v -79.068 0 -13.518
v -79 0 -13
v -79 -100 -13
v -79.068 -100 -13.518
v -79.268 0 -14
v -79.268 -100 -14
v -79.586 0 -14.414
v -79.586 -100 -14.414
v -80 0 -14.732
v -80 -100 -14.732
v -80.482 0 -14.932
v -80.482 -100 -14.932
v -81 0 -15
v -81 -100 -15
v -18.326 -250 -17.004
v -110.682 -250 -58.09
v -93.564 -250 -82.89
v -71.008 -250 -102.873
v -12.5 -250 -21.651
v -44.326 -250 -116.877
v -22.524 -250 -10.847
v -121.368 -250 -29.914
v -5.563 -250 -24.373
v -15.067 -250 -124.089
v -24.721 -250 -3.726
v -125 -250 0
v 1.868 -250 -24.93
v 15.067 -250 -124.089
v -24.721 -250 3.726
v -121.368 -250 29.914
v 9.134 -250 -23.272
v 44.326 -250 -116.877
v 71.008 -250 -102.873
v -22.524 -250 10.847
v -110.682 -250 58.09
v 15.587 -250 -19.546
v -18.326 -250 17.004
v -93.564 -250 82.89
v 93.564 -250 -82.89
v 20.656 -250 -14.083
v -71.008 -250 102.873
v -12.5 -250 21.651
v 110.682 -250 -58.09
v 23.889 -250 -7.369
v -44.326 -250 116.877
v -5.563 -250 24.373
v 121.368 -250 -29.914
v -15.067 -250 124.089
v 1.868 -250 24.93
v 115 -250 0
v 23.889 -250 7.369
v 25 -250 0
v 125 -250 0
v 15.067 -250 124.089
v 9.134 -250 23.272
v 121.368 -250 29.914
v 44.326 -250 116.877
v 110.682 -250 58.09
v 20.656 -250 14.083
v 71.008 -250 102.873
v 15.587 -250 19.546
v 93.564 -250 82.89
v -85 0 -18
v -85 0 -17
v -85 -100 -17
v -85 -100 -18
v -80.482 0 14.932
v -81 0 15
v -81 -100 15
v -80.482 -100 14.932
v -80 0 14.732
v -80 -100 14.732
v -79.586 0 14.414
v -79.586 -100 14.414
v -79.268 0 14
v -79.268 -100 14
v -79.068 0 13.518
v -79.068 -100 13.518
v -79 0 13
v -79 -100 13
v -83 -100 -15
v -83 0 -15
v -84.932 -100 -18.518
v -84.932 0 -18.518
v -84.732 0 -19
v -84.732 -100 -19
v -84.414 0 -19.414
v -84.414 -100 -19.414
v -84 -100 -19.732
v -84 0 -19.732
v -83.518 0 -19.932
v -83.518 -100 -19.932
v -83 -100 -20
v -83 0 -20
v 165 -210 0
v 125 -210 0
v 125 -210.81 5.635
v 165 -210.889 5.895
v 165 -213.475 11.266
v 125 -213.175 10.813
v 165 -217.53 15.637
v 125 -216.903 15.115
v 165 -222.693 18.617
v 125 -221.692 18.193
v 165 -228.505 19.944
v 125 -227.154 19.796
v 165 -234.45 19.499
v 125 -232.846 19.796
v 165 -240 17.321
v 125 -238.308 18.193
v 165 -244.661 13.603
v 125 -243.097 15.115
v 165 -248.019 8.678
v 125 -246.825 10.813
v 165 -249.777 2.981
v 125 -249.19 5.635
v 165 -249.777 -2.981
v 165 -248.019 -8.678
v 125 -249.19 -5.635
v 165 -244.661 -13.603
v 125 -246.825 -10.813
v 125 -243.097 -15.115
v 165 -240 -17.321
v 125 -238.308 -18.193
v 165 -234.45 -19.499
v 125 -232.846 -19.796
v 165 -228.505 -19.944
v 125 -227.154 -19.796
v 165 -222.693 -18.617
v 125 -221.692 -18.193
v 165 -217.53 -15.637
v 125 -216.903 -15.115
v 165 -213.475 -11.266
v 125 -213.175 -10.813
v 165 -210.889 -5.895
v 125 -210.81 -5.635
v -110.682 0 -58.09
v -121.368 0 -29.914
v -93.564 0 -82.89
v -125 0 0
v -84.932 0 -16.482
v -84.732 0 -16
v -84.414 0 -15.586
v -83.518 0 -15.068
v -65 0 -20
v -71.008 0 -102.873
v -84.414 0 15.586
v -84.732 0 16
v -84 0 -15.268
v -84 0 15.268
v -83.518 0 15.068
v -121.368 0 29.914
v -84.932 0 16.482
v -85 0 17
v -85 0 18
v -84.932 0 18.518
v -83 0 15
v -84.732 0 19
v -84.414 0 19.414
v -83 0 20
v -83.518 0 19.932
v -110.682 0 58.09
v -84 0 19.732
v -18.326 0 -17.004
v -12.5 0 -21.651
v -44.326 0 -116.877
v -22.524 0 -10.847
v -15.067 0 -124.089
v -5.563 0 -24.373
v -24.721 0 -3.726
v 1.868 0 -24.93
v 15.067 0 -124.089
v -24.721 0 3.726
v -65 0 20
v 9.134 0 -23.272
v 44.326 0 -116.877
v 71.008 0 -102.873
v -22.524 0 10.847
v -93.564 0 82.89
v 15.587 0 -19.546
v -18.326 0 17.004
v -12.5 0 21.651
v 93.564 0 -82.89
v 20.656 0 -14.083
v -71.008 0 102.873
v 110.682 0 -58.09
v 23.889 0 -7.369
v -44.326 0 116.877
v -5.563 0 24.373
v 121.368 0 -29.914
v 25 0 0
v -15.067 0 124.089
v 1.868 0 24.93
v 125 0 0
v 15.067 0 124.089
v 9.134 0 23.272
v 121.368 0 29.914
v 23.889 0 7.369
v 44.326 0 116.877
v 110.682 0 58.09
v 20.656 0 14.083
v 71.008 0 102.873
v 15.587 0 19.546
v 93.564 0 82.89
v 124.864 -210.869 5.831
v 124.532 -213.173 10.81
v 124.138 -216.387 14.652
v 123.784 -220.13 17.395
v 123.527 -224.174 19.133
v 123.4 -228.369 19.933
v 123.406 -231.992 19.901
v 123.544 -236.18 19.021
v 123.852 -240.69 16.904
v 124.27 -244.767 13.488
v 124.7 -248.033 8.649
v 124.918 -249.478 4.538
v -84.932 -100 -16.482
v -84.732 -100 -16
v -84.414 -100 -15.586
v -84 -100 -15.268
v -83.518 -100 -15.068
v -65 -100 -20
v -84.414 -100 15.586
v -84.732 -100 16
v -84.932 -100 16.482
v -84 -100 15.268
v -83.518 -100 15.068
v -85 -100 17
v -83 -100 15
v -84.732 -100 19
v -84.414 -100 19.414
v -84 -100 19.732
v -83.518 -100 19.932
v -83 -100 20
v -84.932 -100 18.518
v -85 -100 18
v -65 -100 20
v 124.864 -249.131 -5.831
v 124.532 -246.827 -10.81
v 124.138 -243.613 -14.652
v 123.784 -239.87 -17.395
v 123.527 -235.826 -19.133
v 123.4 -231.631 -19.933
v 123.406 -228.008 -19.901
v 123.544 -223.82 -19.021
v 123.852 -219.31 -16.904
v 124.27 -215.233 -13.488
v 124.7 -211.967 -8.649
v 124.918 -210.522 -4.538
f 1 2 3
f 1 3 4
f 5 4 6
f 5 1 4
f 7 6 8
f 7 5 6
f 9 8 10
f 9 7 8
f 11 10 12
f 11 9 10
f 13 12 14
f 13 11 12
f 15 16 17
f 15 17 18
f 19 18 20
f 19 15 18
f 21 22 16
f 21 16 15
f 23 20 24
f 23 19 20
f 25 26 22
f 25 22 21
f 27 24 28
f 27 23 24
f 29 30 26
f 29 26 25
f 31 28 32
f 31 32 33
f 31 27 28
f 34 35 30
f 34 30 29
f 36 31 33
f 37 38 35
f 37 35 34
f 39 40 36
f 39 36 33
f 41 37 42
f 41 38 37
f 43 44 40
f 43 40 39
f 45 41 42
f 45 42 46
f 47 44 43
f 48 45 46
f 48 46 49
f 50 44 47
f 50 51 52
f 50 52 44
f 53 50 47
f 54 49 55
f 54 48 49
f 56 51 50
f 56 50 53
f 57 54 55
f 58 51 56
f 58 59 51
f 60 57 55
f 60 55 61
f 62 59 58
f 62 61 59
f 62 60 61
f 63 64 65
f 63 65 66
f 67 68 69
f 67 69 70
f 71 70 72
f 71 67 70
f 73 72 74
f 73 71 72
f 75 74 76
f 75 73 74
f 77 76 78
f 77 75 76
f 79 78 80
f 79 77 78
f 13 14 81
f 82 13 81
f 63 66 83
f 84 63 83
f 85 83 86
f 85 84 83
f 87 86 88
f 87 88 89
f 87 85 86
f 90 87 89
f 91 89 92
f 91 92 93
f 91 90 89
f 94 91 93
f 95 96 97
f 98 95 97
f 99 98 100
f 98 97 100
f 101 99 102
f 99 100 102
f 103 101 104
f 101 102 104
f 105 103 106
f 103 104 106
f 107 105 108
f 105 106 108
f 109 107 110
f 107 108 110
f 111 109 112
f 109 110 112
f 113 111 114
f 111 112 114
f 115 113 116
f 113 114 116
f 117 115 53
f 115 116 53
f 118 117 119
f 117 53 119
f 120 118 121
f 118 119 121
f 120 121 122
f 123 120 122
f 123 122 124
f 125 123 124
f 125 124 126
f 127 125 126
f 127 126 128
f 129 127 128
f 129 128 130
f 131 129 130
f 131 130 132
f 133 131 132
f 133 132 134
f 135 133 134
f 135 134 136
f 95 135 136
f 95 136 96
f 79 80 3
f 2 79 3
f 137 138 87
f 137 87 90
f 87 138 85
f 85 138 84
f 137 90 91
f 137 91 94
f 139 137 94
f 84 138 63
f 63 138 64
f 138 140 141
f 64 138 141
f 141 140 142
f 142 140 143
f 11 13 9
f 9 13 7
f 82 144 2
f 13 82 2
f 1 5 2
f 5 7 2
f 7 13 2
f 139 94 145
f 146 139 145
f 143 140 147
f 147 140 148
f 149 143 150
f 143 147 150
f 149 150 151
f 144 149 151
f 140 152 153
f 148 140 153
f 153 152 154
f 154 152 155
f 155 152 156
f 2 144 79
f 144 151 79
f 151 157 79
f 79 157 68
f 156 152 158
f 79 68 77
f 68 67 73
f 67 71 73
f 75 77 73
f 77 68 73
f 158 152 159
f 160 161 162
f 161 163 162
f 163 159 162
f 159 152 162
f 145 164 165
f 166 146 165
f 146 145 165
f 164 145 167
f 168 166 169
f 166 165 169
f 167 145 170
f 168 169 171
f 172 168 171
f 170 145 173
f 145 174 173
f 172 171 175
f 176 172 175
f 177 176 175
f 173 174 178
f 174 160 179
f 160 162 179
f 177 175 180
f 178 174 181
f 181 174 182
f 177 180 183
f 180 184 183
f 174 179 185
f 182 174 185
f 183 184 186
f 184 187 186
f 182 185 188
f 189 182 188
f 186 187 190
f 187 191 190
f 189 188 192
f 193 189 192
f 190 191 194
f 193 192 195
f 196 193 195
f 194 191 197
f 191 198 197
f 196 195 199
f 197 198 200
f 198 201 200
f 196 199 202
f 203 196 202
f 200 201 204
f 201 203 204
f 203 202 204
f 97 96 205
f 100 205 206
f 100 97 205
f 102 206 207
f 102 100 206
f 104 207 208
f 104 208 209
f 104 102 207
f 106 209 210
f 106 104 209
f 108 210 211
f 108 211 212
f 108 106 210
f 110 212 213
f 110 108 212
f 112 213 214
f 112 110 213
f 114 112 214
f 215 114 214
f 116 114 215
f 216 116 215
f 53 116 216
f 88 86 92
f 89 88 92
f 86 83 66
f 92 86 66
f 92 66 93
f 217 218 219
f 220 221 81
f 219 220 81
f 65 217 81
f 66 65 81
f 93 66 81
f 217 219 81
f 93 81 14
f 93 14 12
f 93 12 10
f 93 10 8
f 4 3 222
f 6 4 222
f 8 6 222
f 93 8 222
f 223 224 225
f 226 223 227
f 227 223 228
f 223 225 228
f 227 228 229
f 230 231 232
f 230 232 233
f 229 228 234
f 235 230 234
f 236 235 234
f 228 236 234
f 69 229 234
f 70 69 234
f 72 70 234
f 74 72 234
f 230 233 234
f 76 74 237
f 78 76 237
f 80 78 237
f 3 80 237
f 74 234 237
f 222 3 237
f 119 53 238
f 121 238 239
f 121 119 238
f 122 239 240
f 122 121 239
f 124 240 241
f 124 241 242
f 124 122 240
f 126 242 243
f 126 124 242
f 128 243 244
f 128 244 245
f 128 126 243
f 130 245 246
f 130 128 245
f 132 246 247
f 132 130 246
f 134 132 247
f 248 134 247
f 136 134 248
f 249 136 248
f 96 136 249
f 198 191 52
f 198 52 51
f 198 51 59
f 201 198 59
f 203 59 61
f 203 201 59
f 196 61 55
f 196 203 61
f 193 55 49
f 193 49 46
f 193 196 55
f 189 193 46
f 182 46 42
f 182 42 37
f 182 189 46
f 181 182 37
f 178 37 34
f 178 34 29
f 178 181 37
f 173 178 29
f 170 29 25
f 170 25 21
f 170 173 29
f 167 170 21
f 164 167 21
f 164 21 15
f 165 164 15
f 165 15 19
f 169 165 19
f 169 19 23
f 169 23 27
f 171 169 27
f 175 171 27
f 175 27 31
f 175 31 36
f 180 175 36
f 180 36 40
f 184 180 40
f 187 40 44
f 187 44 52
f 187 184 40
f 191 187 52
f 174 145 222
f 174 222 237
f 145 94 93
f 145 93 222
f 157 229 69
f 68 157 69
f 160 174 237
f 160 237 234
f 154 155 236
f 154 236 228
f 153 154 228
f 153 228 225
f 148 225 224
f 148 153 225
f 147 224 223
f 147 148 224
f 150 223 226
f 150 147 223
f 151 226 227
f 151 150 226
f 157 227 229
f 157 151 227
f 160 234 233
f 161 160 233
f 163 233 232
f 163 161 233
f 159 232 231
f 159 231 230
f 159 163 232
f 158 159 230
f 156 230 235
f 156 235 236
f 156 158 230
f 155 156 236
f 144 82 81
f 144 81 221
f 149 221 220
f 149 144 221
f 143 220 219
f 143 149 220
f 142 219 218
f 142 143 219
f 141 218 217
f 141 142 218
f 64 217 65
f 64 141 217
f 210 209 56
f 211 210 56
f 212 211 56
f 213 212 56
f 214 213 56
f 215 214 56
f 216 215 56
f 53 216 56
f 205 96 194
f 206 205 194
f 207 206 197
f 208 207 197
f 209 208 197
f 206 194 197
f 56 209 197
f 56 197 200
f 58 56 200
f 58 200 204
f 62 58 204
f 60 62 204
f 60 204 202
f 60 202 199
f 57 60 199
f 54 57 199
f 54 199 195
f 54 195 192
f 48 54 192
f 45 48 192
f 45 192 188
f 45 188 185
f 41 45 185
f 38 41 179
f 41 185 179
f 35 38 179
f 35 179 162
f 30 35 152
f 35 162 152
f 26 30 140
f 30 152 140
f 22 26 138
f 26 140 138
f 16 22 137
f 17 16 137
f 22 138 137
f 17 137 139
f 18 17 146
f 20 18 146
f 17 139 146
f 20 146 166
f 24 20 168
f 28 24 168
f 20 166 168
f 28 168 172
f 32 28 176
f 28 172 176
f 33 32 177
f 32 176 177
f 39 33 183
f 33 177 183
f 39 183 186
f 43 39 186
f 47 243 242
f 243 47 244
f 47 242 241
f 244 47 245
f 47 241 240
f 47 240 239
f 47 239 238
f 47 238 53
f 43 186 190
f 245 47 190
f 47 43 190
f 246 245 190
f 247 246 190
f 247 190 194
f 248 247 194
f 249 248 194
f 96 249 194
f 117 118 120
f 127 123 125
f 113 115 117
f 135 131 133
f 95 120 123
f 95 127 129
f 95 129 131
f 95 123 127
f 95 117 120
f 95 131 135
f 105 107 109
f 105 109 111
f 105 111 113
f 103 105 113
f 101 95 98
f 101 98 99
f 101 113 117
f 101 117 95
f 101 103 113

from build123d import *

# Parameters (mm, degrees)
F0_R          = 125
F0_R_2        = 25
F1_DEPTH      = 250
F3_DEPTH      = 100
F5_R          = 20
F6_DEPTH      = 40
F6_DEPTH_BACK = 10


with BuildPart() as f1:
    # F0 (on Front) → F1 (new body)
    with BuildSketch(Plane.XZ):
        Circle(F0_R)
        Circle(F0_R_2, mode=Mode.SUBTRACT)
    extrude(amount=F1_DEPTH)

    # F2 (on Front) → F3 (cut)
    with BuildSketch(Plane.XZ):
        with BuildLine():
            Line((-65, 20), (-83, 20))
            ThreePointArc((-83, 20), (-84.414214, 19.414214), (-85, 18))
            Line((-85, 18), (-85, 17))
            ThreePointArc((-85, 17), (-84.414214, 15.585786), (-83, 15))
            Line((-83, 15), (-81, 15))
            ThreePointArc((-81, 15), (-79.585786, 14.414214), (-79, 13))
            Line((-79, 13), (-79, -13))
            ThreePointArc((-79, -13), (-79.585786, -14.414214), (-81, -15))
            Line((-81, -15), (-83, -15))
            ThreePointArc((-83, -15), (-84.414214, -15.585786), (-85, -17))
            Line((-85, -17), (-85, -18))
            ThreePointArc((-85, -18), (-84.414214, -19.414214), (-83, -20))
            Line((-83, -20), (-65, -20))
            Line((-65, -20), (-65, 20))
        make_face()
    extrude(amount=F3_DEPTH, mode=Mode.SUBTRACT)

    # F5 (on offset) → F6 (join, two sides)
    with BuildSketch(Plane.YZ.offset(125)) as f6_sk:
        with Locations((-230, 0)):
            Circle(F5_R)
    extrude(amount=F6_DEPTH)
    extrude(f6_sk.sketch, amount=-F6_DEPTH_BACK)


solid = f1.part
